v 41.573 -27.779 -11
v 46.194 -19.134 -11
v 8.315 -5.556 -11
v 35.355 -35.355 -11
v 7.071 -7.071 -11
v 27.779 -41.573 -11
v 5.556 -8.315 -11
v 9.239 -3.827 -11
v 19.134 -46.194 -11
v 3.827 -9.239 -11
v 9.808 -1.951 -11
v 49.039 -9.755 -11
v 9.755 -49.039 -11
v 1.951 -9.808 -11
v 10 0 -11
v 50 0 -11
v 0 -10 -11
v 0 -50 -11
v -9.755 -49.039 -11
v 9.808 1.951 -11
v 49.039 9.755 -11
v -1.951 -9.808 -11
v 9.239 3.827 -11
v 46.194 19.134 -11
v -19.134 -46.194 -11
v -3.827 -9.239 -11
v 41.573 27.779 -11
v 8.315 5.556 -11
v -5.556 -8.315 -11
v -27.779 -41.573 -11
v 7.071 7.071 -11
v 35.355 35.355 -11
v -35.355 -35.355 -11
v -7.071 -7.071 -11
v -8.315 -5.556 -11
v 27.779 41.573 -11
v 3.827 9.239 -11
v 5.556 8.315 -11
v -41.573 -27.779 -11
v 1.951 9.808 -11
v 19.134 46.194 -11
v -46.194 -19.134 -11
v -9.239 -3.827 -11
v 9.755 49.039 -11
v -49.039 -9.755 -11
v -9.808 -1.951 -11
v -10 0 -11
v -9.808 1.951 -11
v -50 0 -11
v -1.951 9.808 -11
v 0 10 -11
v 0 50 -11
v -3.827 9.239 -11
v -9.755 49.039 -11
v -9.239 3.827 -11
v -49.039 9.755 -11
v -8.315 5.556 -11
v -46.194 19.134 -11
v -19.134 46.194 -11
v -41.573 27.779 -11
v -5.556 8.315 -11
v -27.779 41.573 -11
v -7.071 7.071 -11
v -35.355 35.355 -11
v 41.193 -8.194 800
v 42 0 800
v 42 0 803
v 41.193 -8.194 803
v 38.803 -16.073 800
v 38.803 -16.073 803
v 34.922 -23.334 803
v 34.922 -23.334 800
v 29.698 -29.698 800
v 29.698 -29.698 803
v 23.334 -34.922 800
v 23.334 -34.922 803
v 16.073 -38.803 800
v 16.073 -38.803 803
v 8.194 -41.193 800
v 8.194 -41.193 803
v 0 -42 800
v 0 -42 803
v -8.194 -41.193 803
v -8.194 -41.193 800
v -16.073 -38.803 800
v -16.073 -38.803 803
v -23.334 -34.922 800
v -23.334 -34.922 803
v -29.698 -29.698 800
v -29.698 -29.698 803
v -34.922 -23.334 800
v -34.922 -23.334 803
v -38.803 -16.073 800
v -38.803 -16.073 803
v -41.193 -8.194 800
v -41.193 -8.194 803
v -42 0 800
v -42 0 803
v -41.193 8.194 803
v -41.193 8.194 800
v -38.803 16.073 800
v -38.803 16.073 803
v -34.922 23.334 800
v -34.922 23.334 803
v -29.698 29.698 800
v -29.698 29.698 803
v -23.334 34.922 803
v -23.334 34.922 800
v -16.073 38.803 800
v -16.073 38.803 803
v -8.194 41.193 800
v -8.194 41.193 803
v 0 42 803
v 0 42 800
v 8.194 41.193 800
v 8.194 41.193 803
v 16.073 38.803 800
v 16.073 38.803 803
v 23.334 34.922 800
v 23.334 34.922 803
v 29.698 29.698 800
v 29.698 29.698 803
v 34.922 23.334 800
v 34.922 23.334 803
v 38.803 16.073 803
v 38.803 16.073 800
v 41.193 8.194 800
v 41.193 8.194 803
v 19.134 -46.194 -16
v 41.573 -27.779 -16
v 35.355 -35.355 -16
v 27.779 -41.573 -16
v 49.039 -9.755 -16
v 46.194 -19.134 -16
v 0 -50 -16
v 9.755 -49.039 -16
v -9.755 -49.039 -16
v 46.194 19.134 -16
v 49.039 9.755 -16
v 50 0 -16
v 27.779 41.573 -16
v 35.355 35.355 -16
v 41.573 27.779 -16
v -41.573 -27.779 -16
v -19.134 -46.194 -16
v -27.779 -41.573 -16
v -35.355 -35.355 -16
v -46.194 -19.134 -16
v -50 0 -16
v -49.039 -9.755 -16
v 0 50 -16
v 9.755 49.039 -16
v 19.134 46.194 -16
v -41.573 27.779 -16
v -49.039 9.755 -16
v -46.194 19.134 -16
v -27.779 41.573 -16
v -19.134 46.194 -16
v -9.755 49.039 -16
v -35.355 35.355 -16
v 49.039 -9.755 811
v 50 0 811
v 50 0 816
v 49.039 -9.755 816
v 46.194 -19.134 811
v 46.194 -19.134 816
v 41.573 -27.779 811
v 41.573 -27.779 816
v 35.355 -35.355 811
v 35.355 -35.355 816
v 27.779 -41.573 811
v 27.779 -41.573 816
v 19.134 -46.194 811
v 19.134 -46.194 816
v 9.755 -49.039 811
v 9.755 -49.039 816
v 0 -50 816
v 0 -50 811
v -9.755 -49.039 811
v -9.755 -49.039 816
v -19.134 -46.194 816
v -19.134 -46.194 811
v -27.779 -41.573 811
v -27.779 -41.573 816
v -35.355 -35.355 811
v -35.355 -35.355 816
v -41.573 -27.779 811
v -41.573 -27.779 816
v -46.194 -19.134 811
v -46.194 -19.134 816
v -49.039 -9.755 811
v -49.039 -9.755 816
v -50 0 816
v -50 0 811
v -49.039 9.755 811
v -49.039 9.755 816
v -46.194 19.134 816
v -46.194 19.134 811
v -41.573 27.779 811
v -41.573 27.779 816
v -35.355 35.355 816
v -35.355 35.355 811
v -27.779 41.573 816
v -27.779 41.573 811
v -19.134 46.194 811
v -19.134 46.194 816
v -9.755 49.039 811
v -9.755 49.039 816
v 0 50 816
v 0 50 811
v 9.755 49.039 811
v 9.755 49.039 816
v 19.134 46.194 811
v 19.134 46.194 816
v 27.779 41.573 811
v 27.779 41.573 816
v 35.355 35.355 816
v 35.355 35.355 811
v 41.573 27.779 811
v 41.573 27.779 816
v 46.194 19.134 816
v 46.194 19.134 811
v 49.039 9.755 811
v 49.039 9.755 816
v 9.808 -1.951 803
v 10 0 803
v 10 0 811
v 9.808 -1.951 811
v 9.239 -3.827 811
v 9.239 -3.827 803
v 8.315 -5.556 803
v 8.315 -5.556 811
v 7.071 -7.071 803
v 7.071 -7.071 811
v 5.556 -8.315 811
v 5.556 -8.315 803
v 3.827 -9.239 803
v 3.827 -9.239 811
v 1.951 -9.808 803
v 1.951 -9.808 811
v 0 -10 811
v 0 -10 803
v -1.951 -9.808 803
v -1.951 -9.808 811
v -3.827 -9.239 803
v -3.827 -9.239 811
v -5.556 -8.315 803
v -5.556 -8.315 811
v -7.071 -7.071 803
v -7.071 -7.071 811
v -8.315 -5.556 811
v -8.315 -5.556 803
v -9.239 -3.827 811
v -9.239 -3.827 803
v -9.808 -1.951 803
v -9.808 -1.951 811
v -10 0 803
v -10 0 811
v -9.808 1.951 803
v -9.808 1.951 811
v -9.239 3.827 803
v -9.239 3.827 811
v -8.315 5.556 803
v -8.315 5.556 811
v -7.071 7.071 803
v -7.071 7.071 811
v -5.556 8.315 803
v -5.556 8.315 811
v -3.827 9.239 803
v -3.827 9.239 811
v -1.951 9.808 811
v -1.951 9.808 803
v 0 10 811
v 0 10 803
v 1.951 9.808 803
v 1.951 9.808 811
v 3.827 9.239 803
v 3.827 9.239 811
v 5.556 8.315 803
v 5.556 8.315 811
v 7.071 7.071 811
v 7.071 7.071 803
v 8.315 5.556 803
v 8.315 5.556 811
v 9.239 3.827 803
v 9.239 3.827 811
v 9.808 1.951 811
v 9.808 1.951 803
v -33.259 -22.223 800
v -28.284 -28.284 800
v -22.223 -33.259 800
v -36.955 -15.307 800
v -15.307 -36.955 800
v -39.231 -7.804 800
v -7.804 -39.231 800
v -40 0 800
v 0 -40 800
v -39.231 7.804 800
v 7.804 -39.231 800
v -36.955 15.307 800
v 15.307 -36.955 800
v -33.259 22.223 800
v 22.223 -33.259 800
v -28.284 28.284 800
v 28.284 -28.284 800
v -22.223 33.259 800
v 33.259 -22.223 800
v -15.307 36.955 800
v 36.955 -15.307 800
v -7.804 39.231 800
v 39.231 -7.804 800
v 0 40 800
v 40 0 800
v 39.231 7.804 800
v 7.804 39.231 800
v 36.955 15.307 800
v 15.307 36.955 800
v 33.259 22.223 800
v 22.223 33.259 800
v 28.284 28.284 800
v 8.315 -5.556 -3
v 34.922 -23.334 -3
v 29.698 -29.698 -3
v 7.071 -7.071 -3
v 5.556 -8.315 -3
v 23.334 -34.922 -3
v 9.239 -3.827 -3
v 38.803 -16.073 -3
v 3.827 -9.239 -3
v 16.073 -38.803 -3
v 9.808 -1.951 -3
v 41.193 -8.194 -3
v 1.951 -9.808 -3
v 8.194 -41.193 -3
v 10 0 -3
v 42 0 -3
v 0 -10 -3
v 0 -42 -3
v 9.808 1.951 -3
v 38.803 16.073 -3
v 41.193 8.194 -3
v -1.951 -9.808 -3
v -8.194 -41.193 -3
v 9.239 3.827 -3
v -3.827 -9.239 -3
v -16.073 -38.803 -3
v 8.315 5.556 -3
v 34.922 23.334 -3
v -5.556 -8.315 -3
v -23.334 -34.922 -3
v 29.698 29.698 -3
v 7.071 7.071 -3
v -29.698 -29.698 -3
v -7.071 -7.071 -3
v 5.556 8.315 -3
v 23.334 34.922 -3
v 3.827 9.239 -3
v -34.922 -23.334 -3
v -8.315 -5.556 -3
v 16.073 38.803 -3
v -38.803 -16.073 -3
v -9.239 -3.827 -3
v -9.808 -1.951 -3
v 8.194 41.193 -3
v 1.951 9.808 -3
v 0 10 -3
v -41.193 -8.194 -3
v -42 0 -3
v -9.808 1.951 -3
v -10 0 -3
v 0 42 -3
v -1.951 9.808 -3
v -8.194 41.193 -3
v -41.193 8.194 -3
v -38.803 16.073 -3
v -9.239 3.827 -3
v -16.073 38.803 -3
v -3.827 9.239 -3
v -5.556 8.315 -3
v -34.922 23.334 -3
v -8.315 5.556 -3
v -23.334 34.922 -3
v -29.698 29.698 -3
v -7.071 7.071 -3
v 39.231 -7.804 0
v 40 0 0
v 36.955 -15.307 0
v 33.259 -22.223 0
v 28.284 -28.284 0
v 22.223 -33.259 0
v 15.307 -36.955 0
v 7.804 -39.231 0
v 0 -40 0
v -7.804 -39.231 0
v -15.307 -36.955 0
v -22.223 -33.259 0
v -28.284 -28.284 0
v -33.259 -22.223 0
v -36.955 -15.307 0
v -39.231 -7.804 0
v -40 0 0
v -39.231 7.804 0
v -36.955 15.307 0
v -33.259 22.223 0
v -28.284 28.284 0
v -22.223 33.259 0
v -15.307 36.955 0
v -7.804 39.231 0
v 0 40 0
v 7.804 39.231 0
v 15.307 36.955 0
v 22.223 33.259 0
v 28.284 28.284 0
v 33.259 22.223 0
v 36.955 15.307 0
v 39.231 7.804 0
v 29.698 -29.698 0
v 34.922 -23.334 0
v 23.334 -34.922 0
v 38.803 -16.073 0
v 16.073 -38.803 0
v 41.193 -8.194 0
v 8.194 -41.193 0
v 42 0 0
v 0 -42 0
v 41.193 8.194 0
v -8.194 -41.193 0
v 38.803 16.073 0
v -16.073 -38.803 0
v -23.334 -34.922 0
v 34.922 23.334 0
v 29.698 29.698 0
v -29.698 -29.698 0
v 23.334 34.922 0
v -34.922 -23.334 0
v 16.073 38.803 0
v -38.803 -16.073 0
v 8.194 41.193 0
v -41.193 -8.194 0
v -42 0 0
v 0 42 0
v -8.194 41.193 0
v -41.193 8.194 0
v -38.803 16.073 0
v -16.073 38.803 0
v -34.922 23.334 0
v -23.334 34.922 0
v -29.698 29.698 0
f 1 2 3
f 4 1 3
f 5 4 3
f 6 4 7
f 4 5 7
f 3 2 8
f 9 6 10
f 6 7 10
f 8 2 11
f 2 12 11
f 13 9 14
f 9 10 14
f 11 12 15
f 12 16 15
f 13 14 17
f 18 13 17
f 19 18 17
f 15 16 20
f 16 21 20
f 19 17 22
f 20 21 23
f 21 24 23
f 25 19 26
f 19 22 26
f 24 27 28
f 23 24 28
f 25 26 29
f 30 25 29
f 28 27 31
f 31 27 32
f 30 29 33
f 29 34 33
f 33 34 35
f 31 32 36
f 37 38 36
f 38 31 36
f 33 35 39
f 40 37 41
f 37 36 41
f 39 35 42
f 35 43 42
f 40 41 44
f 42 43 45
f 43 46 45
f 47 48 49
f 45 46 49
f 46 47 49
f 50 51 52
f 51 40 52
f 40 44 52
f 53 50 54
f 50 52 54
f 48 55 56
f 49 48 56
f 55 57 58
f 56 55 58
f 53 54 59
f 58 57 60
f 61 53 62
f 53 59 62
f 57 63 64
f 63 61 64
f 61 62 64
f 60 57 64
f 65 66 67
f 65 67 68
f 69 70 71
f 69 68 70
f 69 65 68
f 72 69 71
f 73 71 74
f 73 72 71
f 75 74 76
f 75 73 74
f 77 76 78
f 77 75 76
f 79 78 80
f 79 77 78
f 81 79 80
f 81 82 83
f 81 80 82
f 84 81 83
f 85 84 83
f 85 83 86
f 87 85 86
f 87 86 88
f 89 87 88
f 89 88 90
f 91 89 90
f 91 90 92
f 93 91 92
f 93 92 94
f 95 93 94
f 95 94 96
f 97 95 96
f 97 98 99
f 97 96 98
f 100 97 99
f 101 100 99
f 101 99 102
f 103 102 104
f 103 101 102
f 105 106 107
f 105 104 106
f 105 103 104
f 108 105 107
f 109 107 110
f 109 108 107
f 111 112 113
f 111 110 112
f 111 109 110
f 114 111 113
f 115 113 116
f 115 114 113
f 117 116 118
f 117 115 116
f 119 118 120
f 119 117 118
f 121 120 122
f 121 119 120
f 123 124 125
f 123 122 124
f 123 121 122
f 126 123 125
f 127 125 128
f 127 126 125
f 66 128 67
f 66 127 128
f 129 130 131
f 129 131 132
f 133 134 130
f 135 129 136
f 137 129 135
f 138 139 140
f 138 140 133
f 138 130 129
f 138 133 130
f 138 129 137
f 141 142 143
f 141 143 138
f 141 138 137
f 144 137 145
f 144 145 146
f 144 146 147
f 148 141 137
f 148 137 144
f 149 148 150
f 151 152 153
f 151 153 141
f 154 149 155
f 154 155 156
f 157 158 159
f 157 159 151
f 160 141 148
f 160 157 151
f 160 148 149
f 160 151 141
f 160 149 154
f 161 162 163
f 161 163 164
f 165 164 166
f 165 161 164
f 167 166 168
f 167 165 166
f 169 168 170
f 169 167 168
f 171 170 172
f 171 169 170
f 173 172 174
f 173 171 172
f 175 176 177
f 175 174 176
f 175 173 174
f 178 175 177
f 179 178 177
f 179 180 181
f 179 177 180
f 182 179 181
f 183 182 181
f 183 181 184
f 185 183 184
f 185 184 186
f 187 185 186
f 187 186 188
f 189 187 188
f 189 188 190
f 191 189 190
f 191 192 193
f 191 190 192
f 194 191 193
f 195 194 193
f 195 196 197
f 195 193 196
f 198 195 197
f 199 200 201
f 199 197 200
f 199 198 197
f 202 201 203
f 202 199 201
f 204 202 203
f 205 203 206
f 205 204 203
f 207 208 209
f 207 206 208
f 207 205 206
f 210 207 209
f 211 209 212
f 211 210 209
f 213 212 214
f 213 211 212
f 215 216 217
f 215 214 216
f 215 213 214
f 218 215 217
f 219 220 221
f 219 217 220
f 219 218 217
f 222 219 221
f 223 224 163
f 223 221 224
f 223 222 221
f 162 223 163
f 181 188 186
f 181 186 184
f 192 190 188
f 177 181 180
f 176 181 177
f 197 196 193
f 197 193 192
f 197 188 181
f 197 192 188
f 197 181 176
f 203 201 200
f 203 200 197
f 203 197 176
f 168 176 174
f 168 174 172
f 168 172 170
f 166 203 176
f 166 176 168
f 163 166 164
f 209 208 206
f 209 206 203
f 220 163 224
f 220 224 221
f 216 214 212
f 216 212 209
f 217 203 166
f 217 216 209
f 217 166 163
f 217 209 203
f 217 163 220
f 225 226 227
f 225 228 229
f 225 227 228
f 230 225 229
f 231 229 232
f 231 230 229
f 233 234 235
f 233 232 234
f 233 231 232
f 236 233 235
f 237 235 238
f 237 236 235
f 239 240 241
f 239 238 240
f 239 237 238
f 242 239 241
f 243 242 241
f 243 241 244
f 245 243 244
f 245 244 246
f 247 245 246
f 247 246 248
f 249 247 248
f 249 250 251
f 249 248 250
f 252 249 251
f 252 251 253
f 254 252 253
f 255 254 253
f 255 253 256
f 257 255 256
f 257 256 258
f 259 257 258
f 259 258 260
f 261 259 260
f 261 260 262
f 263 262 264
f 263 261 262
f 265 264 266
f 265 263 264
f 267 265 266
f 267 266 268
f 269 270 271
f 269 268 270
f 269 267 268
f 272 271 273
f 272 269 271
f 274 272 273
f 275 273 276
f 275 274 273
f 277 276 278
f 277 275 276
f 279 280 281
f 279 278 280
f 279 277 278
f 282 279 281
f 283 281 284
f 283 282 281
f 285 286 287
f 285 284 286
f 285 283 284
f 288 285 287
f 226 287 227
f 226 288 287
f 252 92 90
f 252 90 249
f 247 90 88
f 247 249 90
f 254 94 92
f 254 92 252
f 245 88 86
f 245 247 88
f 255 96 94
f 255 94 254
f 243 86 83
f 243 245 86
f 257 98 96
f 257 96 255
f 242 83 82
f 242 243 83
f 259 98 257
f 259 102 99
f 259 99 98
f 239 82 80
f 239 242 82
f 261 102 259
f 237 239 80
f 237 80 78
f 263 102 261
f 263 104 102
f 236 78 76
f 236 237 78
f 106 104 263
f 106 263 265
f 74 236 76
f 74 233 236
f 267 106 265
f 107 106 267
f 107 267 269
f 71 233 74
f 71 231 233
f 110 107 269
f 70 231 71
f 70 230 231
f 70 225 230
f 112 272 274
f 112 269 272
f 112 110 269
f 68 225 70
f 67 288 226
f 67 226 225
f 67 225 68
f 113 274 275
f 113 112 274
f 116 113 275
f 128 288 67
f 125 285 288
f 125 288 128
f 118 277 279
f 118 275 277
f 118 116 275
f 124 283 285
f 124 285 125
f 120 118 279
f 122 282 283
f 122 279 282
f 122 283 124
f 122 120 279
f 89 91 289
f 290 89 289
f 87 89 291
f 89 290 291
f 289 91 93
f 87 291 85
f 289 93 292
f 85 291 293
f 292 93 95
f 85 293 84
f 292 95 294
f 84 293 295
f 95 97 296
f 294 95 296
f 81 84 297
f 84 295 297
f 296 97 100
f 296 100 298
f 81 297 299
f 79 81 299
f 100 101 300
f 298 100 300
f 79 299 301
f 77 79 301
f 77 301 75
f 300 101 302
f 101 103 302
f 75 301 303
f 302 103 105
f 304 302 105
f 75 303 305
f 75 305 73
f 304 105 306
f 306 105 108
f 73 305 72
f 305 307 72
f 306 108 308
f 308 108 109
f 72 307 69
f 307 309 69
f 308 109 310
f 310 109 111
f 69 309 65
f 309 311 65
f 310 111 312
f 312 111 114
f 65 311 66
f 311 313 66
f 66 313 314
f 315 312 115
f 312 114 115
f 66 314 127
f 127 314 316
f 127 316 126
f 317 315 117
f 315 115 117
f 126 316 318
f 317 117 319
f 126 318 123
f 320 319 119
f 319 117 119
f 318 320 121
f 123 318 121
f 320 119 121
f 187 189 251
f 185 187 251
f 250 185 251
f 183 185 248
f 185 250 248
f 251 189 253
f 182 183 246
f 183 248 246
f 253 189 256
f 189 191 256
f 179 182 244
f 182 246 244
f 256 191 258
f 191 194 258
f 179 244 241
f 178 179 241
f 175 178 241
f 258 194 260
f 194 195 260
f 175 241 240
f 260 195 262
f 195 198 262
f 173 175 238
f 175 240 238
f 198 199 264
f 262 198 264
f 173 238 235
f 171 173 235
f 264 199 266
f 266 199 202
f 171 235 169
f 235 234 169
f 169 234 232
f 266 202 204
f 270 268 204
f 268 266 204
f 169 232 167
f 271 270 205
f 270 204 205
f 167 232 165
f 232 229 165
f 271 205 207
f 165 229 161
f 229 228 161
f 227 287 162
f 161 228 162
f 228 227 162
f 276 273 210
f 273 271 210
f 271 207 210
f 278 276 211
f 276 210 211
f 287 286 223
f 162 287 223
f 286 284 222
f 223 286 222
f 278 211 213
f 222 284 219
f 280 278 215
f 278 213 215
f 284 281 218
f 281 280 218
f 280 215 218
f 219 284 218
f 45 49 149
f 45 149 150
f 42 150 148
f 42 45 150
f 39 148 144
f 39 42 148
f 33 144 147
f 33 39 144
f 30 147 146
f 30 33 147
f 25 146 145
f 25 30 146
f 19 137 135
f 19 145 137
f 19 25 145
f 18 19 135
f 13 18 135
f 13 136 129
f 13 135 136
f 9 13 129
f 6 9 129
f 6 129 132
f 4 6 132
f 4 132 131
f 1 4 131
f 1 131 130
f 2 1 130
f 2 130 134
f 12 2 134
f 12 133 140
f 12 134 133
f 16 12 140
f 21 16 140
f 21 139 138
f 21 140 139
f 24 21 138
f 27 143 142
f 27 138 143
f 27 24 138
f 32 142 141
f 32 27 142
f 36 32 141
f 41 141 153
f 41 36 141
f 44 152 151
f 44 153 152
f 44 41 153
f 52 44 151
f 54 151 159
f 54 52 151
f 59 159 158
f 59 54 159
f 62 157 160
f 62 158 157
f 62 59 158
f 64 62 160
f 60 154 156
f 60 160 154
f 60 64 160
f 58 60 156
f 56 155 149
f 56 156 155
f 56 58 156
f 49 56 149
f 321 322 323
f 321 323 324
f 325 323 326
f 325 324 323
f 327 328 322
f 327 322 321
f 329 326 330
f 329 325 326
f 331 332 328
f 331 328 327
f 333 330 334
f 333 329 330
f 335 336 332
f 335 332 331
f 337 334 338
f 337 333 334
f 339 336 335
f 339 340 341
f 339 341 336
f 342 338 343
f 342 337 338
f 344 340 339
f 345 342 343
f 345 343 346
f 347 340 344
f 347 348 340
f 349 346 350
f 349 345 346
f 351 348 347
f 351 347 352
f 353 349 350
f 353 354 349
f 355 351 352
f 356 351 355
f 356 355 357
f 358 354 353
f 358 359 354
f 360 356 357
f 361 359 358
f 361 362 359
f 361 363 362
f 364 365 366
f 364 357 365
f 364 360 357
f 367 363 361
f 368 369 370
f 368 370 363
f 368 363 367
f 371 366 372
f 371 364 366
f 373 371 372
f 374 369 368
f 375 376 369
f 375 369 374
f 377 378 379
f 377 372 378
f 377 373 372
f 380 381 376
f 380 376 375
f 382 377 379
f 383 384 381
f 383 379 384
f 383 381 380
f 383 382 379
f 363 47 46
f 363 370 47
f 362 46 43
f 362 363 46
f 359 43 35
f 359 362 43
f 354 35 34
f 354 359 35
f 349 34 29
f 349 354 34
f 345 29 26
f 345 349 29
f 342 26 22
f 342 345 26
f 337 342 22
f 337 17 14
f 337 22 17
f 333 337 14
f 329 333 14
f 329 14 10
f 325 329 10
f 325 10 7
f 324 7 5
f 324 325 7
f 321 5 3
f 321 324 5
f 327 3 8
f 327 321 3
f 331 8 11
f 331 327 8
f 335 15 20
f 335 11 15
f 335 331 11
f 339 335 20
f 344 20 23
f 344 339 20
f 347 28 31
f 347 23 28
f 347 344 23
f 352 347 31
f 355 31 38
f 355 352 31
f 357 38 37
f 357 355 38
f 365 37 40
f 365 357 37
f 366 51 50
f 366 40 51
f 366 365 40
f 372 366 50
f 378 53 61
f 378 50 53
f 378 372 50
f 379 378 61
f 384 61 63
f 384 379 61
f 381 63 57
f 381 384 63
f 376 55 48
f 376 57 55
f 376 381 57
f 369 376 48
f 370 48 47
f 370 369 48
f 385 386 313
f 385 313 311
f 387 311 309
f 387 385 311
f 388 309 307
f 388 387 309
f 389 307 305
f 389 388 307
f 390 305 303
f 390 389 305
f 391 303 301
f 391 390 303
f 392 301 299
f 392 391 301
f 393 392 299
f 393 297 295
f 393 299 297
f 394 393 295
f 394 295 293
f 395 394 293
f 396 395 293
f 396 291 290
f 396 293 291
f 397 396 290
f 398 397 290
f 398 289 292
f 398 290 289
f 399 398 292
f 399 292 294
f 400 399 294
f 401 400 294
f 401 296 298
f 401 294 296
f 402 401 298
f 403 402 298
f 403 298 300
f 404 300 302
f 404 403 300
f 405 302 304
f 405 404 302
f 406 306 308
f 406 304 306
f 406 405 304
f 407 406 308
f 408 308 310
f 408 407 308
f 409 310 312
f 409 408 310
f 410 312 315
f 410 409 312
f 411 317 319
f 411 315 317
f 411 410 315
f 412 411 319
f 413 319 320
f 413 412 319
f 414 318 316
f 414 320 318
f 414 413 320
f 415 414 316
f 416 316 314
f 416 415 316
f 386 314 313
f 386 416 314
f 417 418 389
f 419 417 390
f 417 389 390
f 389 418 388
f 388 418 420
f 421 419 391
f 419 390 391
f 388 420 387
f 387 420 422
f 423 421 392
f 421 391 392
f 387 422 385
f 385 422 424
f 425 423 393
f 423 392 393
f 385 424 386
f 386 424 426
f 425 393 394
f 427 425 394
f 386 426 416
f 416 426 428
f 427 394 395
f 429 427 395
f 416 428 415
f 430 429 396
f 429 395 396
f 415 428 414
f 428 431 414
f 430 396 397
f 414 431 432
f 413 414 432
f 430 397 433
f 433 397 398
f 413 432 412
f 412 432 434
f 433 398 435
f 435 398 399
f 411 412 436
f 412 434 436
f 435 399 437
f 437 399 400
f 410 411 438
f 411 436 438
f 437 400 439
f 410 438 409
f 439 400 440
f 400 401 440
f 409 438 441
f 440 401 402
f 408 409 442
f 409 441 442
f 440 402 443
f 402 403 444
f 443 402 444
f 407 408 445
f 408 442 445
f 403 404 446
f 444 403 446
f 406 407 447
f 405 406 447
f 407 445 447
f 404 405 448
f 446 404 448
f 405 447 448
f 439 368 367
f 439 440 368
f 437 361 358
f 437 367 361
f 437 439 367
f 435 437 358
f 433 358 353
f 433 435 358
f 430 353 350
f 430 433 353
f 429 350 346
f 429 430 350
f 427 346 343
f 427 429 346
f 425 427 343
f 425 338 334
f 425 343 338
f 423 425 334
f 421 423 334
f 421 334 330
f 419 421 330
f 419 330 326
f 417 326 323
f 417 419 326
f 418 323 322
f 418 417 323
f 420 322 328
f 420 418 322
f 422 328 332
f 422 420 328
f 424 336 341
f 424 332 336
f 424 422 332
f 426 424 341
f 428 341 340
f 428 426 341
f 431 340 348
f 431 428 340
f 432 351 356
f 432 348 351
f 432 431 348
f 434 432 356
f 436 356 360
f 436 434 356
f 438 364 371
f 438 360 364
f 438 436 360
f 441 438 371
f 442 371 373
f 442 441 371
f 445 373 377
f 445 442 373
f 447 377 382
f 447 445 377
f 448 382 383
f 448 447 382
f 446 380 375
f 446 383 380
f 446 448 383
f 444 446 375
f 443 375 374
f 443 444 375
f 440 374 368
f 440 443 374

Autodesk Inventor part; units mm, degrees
ref_plane "YZ Plane" through (0, 0, 0) normal (1, 0, 0) x (0, 1, 0)
ref_plane "XZ Plane" through (0, 0, 0) normal (0, 1, 0) x (-1, 0, 0)
ref_plane "XY Plane" through (0, 0, 0) normal (0, 0, 1) x (1, 0, 0)
sketch "Sketch1" plane through (0, 0, 0) normal (0, 0, 1) x (1, 0, 0)
  circle A0 centre (0, 0) radius 40
  dimension "d1" = 80
extrude "Extrusion1" add sketch "Sketch1" along normal blind 800
sketch "Sketch2" plane through (0, 0, 800) normal (0, 0, 1) x (1, 0, 0)
  circle A0 centre (0, 0) radius 42
  dimension "d4" = 84
extrude "Extrusion2" add sketch "Sketch2" along normal blind 3
sketch "Sketch3" plane through (0, 0, 0) normal (0, 0, -1) x (-1, 0, 0)
  circle A0 centre (0, 0) radius 42
  dimension "d9" = 84
extrude "Extrusion3" add sketch "Sketch3" along normal blind 3
sketch "Sketch4" plane through (0, 0, 803) normal (0, 0, 1) x (1, 0, 0)
  circle A0 centre (0, 0) radius 10
  dimension "d10" = 20
extrude "Extrusion4" add sketch "Sketch4" along normal blind 8
sketch "Sketch5" plane through (0, 0, -3) normal (0, 0, -1) x (-1, 0, 0)
  circle A0 centre (0, 0) radius 10 projected
  circle A1 centre (0, 0) radius 10
extrude "Extrusion5" add sketch "Sketch5" along normal blind 8
sketch "Sketch6" plane through (0, 0, -11) normal (0, 0, -1) x (-1, 0, 0)
  circle A0 centre (0, 0) radius 50
  dimension "d15" = 100
extrude "Extrusion6" add sketch "Sketch6" along normal blind 5
sketch "Sketch7" plane through (0, 0, 811) normal (0, 0, 1) x (1, 0, 0)
  circle A0 centre (0, 0) radius 50
extrude "Extrusion7" add sketch "Sketch7" along normal blind 5
properties part number "TrucBangTai"
